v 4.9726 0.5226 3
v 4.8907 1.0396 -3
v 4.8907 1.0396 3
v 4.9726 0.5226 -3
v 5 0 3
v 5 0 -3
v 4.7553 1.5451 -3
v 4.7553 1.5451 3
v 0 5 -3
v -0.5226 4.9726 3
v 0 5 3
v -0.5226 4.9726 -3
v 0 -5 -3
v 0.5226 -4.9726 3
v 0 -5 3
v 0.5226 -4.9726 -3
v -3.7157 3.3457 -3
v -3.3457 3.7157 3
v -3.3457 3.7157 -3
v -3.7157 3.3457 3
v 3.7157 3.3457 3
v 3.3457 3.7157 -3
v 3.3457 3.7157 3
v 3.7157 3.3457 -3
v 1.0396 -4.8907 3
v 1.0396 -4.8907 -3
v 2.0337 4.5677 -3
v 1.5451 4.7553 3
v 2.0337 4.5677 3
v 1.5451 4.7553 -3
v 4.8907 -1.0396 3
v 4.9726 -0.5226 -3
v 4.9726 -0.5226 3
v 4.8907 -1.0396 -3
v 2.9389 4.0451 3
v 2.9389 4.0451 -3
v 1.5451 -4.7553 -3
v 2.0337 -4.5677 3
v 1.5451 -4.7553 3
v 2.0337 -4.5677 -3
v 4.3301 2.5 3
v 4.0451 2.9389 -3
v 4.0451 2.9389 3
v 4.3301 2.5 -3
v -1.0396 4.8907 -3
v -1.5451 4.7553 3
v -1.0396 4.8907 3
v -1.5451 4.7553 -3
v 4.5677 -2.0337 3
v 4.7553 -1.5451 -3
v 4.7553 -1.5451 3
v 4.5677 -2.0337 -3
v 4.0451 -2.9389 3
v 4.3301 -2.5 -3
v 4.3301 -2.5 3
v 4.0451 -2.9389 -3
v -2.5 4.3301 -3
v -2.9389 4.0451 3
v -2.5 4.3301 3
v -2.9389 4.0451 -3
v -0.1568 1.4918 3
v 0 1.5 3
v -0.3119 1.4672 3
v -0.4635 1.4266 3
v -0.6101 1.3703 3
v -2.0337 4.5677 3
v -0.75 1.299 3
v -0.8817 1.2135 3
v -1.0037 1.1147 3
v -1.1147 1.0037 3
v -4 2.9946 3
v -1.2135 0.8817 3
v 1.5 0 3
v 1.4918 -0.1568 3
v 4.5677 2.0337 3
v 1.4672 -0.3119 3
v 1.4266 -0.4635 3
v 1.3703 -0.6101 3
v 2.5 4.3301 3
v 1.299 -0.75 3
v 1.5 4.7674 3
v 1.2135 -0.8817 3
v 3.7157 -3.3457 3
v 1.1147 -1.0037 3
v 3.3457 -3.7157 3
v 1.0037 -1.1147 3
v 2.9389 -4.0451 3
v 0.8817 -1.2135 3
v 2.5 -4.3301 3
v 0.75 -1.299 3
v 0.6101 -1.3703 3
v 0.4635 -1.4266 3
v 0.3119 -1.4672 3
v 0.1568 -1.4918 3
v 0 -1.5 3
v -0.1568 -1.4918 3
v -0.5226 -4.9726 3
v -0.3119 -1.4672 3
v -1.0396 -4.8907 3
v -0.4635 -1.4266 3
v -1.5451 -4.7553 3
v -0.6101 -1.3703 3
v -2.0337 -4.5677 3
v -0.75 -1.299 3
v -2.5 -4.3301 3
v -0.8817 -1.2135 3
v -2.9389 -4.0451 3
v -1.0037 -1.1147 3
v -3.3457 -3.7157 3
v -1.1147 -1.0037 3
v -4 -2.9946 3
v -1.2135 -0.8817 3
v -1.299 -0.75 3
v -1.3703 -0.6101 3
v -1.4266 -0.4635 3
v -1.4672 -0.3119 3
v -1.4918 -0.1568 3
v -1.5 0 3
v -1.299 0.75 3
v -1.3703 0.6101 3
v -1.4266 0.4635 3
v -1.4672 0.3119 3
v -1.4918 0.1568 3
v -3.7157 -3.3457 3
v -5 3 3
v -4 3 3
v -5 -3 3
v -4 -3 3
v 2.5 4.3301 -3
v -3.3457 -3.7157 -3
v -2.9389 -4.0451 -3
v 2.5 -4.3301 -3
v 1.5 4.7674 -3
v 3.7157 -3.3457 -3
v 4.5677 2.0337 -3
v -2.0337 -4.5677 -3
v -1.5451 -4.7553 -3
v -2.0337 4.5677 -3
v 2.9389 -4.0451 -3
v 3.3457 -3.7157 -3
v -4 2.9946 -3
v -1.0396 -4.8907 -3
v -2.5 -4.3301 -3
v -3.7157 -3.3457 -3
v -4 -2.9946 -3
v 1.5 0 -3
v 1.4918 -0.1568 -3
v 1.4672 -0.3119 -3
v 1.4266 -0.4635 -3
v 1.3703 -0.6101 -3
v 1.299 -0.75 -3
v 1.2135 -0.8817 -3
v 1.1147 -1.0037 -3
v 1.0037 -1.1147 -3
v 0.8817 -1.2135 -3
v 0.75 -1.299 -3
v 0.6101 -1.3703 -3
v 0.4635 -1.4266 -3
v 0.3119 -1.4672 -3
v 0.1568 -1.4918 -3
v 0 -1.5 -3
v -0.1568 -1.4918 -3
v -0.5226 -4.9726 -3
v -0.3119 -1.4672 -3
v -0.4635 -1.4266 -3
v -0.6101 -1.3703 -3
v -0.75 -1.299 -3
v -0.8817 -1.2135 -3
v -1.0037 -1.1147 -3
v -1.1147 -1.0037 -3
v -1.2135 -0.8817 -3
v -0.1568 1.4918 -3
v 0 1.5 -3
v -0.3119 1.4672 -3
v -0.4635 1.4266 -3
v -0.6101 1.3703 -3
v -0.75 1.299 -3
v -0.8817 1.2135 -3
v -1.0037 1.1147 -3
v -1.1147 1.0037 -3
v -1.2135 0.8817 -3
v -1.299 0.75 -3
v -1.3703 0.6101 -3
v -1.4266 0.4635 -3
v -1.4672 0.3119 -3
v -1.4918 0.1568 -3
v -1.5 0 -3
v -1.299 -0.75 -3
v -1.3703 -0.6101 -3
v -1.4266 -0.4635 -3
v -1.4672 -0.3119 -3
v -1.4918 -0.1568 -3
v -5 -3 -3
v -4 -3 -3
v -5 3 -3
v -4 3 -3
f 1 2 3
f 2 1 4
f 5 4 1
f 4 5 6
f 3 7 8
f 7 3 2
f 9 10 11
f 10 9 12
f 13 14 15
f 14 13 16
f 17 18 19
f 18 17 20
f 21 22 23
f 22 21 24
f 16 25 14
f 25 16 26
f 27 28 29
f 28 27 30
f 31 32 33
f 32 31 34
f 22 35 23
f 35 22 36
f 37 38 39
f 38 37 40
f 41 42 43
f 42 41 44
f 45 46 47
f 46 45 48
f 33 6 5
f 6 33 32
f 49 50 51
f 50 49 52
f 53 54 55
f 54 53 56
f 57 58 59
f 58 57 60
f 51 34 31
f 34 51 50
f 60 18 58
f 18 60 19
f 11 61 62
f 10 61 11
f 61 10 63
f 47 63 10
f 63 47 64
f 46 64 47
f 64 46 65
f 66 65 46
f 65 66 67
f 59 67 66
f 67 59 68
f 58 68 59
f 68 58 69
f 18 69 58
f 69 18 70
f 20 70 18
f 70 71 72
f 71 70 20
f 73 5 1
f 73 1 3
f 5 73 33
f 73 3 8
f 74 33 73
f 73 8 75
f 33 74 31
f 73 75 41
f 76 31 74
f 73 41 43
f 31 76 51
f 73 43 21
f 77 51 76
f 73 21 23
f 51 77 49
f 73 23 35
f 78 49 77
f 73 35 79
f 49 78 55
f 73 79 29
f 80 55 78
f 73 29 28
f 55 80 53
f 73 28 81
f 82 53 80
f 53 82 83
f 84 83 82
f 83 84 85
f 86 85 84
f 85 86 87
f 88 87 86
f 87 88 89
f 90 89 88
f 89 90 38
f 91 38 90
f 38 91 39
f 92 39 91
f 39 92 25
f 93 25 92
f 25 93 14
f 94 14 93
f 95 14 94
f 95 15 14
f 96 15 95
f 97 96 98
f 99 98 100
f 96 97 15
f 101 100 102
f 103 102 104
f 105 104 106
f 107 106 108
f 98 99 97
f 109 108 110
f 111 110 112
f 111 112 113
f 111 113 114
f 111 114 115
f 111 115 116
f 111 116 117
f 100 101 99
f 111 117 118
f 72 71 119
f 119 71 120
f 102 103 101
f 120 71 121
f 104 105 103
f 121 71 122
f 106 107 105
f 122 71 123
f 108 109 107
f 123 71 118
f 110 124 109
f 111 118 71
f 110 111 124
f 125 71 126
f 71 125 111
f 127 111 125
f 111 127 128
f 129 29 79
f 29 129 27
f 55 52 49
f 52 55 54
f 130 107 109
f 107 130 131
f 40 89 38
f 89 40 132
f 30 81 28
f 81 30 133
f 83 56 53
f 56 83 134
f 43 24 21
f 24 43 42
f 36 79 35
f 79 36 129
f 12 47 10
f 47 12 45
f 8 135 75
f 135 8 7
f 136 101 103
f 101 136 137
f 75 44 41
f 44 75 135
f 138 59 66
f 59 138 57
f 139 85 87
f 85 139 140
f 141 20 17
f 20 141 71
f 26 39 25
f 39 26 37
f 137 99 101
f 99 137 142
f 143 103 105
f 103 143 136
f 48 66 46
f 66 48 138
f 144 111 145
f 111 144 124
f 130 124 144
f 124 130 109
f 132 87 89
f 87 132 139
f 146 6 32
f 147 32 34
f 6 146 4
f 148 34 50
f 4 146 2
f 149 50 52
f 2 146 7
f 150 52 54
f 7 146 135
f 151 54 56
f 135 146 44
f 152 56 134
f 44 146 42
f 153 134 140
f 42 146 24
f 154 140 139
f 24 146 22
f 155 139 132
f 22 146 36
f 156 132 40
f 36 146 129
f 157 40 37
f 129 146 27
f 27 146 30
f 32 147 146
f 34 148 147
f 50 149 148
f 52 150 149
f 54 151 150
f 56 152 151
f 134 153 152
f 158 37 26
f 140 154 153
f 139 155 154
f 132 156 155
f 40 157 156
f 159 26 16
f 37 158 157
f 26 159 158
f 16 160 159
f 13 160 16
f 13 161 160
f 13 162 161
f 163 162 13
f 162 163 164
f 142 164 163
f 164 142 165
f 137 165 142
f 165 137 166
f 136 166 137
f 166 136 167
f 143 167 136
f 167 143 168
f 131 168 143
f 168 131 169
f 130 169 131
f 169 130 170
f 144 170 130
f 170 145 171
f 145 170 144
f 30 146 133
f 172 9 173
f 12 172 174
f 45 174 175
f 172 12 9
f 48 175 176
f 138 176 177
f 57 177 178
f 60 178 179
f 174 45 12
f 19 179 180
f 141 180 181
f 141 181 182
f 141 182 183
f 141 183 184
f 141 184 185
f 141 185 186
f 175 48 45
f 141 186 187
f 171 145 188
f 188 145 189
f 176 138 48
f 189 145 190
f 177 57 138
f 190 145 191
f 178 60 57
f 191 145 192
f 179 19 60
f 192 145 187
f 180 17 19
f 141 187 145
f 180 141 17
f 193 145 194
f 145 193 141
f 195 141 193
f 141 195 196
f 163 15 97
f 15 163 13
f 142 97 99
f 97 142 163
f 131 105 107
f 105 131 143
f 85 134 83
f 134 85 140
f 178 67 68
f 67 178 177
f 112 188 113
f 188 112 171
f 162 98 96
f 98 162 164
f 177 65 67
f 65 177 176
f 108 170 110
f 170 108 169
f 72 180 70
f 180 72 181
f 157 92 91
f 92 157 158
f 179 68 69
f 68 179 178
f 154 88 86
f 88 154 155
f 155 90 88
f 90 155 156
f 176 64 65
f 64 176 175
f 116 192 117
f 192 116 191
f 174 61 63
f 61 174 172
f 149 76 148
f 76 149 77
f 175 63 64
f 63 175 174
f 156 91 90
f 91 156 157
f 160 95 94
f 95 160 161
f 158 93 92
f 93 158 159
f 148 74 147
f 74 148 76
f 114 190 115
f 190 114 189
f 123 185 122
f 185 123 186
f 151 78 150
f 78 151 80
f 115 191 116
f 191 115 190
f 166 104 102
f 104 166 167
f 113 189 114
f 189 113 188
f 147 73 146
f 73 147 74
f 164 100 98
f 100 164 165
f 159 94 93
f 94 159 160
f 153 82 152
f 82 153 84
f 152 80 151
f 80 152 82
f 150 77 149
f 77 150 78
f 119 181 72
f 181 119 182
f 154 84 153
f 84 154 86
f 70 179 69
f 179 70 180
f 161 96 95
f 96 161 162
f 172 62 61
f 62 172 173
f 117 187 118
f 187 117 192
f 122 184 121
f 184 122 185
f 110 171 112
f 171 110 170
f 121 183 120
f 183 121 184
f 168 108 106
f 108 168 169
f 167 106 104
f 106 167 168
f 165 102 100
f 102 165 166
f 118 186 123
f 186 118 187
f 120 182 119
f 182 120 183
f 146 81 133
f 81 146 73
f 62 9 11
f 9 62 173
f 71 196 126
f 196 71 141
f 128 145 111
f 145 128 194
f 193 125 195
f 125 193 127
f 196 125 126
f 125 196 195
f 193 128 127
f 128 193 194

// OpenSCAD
$fn=60;
color("SlateGray")

difference(){
cylinder(h = 6, d=10, center = true);
cylinder(h = 9, d=3, center = true);

translate(v = [-0, -0, -4.5])
cube(size = [1.5,8,10]);
}

color("SlateGray")
translate(v = [-5, -3, -3])
cube(size = [1,6,6]);
